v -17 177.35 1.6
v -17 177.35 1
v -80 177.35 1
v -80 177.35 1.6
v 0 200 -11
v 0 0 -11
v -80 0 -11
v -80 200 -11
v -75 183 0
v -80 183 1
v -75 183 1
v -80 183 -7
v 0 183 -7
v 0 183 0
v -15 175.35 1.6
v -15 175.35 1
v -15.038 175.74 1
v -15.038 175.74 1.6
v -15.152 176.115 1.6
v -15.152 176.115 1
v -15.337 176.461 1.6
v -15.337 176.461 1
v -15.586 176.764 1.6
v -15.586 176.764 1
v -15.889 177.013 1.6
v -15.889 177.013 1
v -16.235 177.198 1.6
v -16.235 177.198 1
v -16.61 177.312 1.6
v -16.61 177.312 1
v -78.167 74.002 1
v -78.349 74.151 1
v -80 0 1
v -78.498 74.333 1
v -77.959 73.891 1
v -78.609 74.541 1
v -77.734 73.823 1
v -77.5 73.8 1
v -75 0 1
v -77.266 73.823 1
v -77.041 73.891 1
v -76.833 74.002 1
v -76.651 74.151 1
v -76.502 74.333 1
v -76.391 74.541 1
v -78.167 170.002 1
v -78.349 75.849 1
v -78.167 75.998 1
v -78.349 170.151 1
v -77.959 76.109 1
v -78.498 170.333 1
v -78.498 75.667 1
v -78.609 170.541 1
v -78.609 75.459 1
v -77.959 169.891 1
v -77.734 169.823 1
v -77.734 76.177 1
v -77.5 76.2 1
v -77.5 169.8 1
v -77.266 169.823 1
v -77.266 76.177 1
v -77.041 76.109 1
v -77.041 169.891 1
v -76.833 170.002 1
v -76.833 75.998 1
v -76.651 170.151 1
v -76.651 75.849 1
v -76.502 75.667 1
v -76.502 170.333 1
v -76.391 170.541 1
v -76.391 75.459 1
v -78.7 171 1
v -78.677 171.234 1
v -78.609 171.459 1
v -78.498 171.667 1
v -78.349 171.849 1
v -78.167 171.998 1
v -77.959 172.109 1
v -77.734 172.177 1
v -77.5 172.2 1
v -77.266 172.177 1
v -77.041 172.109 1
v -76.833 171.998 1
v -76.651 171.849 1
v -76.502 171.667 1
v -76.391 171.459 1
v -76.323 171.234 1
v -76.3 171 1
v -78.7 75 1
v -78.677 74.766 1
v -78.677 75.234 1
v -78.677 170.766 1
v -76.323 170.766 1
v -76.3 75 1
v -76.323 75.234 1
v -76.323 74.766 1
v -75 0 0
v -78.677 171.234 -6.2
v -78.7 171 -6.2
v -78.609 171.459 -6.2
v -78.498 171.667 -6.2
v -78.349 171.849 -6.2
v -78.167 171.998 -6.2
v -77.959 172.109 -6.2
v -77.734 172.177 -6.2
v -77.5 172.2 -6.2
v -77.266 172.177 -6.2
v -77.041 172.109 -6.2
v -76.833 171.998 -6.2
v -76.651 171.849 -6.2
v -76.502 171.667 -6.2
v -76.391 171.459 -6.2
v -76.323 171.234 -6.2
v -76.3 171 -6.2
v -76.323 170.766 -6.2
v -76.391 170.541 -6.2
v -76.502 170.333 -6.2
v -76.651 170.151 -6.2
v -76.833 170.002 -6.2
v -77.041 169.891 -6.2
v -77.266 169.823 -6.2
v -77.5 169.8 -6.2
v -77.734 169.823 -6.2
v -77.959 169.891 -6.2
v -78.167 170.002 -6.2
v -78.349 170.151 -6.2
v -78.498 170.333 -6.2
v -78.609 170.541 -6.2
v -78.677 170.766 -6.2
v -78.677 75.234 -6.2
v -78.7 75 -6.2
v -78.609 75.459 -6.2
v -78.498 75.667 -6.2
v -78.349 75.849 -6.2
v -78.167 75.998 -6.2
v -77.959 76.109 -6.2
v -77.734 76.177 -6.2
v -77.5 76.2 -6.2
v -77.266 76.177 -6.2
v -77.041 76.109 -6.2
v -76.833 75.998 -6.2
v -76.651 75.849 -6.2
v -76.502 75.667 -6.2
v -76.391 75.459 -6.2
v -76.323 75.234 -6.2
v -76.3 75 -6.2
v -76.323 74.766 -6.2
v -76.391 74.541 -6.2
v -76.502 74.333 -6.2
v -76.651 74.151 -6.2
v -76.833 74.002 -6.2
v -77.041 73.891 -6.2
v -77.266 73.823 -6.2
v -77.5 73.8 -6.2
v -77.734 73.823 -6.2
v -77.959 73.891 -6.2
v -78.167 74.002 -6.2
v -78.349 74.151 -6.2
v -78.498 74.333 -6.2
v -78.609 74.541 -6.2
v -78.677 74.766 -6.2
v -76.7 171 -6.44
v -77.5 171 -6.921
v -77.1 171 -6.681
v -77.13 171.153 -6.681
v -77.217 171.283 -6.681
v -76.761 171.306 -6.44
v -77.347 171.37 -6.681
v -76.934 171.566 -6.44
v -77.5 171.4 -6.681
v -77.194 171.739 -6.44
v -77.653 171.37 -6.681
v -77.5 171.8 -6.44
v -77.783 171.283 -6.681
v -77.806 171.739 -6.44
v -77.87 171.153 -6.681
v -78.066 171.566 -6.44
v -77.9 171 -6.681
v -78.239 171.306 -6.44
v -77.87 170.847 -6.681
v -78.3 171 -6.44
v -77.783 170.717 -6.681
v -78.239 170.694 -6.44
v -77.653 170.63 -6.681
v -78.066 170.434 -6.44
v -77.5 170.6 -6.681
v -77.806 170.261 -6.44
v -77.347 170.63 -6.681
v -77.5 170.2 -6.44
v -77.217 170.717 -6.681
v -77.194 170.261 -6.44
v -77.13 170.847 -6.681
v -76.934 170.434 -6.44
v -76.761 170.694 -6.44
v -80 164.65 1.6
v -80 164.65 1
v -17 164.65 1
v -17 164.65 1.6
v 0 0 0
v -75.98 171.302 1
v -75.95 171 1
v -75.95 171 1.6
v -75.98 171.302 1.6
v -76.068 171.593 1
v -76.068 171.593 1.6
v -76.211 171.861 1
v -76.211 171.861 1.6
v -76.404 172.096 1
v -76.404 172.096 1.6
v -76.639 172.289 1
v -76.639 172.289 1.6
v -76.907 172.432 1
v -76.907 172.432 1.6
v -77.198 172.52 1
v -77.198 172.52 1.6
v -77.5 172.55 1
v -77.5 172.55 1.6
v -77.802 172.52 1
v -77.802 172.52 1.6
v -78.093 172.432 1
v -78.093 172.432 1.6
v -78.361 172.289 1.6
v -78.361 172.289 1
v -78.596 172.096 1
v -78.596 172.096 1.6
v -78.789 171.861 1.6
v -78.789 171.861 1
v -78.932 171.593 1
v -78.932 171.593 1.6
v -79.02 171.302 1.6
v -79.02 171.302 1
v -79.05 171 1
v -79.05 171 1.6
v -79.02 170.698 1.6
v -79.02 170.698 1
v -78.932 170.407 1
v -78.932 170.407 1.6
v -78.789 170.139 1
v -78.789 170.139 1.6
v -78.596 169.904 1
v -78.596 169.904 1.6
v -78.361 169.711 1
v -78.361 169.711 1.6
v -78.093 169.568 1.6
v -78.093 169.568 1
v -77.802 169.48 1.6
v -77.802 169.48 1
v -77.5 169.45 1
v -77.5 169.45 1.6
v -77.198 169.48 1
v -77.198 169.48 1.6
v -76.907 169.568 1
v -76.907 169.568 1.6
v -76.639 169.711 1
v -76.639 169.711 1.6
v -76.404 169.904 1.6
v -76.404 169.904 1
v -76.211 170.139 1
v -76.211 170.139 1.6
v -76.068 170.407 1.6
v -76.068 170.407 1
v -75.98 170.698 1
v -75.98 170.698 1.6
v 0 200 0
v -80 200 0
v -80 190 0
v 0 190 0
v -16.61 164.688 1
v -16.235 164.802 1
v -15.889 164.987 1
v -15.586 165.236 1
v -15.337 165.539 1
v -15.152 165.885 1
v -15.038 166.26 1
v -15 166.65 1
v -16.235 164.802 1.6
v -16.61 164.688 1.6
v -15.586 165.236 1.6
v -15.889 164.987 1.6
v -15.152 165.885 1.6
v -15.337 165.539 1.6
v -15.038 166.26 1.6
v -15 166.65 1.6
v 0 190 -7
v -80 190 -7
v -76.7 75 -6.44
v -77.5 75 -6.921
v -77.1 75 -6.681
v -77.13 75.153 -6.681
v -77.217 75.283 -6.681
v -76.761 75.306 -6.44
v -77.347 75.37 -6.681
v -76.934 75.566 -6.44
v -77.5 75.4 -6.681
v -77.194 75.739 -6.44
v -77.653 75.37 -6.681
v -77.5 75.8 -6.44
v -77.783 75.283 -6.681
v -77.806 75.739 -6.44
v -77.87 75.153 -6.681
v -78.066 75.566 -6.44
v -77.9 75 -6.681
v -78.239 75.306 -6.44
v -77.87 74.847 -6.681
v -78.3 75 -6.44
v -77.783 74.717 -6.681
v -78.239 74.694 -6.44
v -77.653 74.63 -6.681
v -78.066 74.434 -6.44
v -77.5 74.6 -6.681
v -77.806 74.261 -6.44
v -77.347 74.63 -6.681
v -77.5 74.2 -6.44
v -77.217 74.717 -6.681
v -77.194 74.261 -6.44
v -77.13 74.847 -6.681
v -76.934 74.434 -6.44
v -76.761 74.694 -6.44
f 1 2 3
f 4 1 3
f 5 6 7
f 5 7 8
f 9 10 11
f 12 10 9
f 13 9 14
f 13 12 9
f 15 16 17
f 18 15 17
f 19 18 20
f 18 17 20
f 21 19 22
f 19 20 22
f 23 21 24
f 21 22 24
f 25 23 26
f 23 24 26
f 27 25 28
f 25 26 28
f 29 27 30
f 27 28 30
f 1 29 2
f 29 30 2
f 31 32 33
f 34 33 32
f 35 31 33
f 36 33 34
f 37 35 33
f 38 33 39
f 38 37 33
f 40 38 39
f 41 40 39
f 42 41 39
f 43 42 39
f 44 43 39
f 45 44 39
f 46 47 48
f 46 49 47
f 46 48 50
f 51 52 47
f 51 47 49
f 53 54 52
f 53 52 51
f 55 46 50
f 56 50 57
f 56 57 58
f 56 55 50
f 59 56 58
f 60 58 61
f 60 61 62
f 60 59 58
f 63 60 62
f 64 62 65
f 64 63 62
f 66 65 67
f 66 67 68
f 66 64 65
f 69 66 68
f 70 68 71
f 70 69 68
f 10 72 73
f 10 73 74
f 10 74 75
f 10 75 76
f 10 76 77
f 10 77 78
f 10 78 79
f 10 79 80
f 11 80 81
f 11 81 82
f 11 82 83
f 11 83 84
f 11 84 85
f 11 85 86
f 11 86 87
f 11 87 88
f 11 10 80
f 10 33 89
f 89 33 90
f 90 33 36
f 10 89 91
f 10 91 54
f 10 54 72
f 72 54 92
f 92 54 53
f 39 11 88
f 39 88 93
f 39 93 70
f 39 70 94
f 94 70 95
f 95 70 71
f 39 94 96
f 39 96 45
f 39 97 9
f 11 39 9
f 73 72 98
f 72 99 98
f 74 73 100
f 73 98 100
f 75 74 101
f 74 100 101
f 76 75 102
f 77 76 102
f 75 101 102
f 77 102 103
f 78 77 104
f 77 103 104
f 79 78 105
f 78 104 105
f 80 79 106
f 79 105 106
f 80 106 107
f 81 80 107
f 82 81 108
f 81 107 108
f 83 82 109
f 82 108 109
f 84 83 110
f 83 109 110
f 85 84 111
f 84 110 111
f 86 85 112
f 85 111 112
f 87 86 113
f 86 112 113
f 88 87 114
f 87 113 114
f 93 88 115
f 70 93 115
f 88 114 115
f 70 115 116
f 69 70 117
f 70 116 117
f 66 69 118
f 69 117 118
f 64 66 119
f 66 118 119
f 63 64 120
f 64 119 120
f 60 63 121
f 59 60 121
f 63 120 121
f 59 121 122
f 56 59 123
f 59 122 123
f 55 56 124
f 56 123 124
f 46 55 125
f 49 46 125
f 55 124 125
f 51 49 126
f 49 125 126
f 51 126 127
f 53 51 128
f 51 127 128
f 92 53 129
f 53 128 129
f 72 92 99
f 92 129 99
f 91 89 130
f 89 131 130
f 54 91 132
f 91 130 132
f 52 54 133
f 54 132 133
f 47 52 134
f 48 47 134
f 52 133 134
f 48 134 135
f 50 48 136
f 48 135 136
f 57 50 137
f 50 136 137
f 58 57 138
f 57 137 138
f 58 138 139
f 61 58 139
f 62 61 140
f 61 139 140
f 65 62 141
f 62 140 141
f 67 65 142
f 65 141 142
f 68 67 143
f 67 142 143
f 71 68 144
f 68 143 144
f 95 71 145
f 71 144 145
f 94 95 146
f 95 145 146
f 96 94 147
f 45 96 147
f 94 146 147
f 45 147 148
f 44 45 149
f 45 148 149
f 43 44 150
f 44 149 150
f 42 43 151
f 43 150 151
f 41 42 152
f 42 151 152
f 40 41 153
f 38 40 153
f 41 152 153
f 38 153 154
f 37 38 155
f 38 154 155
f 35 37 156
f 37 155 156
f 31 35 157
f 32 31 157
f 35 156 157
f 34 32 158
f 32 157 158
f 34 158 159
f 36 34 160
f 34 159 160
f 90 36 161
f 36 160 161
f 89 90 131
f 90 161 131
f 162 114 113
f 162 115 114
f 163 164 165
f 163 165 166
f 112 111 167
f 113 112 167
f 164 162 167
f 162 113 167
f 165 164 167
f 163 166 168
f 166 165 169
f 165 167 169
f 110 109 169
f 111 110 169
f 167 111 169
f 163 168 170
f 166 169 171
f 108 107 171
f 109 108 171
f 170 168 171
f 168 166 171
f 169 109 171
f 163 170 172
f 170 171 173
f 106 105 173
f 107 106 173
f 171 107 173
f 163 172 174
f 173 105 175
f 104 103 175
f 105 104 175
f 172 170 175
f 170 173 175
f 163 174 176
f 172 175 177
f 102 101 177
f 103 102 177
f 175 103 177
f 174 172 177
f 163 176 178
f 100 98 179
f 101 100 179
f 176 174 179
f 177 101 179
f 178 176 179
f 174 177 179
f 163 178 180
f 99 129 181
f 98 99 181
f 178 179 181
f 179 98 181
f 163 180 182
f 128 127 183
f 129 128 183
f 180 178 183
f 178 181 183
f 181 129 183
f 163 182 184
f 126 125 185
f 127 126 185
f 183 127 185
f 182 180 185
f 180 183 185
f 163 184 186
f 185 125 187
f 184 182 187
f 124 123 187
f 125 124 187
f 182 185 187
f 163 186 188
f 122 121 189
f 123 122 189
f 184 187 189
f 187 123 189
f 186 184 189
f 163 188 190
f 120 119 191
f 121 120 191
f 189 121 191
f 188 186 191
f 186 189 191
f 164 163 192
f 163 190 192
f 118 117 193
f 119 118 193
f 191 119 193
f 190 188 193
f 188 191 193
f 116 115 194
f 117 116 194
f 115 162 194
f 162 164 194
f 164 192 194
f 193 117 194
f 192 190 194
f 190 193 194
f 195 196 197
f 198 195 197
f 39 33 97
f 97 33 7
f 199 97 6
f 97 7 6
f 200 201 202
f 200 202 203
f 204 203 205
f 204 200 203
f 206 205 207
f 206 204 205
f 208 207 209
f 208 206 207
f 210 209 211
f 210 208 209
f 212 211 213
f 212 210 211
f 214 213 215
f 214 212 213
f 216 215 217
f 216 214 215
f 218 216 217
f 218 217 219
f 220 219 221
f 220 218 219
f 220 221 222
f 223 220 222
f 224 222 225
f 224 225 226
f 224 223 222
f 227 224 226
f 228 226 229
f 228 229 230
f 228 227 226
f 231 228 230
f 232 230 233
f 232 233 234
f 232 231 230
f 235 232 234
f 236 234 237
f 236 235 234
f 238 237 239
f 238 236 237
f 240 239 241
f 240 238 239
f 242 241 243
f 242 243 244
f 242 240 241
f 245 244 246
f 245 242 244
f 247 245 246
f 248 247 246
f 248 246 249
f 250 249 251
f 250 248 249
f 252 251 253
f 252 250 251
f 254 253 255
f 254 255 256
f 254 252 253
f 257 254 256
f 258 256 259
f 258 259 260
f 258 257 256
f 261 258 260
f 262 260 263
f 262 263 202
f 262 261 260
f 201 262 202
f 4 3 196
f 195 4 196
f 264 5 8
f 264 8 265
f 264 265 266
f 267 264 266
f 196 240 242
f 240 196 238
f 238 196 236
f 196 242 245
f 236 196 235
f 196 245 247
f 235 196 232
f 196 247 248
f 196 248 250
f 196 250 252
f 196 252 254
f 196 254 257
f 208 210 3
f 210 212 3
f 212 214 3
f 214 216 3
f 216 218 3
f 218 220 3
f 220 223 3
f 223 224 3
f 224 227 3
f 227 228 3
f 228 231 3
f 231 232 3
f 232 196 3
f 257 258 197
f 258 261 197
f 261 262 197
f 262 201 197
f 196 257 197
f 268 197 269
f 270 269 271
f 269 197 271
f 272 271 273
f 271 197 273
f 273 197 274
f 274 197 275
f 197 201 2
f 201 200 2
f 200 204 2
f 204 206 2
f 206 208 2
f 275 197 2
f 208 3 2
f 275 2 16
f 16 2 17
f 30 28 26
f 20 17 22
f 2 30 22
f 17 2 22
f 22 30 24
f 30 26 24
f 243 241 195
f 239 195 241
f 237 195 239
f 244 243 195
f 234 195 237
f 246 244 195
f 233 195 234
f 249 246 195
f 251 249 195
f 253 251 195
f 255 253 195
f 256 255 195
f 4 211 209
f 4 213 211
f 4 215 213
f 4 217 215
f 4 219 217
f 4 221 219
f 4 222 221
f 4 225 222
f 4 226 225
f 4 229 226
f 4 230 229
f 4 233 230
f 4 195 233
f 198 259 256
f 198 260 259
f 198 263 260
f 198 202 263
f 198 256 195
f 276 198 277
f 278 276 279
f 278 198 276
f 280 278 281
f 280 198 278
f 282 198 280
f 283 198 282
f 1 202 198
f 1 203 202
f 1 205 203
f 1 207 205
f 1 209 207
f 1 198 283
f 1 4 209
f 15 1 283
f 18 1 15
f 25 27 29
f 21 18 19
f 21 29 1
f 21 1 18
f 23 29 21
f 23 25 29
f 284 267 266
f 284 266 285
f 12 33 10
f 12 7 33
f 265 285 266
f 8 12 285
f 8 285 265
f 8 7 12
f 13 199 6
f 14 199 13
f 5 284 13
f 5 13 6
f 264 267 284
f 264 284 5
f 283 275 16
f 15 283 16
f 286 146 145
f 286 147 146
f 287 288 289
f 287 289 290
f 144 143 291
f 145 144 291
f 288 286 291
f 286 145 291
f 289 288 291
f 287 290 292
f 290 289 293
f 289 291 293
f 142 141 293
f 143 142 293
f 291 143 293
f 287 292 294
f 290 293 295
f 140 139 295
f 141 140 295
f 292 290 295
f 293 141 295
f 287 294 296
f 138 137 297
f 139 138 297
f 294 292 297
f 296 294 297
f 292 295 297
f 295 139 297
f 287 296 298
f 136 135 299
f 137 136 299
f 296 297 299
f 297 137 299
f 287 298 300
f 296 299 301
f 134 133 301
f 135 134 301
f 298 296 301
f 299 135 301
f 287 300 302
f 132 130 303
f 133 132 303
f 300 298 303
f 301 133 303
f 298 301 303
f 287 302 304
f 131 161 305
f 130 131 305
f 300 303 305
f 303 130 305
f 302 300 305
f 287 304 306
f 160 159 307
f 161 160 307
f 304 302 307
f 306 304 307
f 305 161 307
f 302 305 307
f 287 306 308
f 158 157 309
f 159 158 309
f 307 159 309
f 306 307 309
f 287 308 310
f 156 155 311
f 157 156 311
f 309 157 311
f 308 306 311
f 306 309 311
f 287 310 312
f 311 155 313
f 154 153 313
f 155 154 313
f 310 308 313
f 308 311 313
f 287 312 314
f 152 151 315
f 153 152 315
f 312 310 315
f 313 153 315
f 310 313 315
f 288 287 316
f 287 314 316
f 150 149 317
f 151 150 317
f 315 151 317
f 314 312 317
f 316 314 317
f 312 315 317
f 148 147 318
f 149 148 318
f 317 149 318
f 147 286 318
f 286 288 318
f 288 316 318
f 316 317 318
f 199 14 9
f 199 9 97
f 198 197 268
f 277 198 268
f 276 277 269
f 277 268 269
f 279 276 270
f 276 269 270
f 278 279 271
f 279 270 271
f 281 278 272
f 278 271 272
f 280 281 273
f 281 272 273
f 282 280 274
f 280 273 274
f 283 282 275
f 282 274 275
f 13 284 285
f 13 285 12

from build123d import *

# Parameters (mm, degrees)
F1_DEPTH = 80
F2_W     = 5
F2_H     = 183
F3_DEPTH = 1
F5_D     = 2.4
F5_DEPTH = 7.2
F5_TIP   = 0.7210327428
F6_R     = 1.55
F7_DEPTH = 0.6


with BuildPart() as f1:
    # F0 (on Right) → F1 (new body)
    with BuildSketch(Plane.YZ):
        Polygon((183, 0), (0, 0), (0, -11), (200, -11), (200, 0), (190, 0), (190, -7), (183, -7), align=None)
    extrude(amount=-F1_DEPTH)

    # F2 (on face) → F3 (join)
    with BuildSketch(Plane.XY):
        with Locations((-77.5, 91.5)):
            Rectangle(F2_W, F2_H)
    extrude(amount=F3_DEPTH)

    # F5
    with Locations(Plane.XY.offset(1)):
        with Locations((-77.5, 171), (-77.5, 75)):
            Hole(F5_D / 2, depth=F5_DEPTH)
            with Locations((0, 0, -(F5_DEPTH + F5_TIP / 2))):  # 118° drill point
                Cone(0, F5_D / 2, F5_TIP, mode=Mode.SUBTRACT)


with BuildPart() as f7:
    # F6 (on face) → F7 (new body)
    with BuildSketch(Plane.XY.offset(1)):
        with BuildLine():
            Line((-17, 177.35), (-80, 177.35))
            Line((-80, 177.35), (-80, 164.65))
            Line((-80, 164.65), (-17, 164.65))
            ThreePointArc((-17, 164.65), (-15.5857864376, 165.2357864376), (-15, 166.65))
            Line((-15, 166.65), (-15, 175.35))
            ThreePointArc((-15, 175.35), (-15.5857864376, 176.7642135624), (-17, 177.35))
        make_face()
        with Locations((-77.5, 171)):
            Circle(F6_R, mode=Mode.SUBTRACT)
    extrude(amount=F7_DEPTH)


solid = Compound([f1.part, f7.part])
